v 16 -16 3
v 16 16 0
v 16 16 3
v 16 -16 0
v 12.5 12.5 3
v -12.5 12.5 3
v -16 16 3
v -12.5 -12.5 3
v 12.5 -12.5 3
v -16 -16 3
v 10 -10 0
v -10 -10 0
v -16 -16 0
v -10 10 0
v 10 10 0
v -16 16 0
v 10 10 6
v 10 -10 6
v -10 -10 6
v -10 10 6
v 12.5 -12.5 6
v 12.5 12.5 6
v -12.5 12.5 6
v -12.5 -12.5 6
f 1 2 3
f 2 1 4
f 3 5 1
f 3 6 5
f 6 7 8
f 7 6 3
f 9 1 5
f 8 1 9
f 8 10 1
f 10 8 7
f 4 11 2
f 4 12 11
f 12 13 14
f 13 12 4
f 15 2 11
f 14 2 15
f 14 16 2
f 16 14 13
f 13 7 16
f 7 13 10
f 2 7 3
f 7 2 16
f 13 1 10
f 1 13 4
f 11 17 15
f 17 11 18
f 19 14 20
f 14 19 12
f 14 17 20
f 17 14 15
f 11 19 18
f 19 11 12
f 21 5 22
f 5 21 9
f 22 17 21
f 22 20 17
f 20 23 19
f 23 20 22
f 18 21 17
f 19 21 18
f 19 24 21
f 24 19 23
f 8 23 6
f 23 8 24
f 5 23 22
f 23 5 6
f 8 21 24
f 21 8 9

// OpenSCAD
tilesize = 24;
wallthickness = 3;

//base
difference() {
translate([0,0,wallthickness/2])
cube([((tilesize+2)+(wallthickness*2)),((tilesize+2)+(wallthickness*2)),wallthickness],true);
translate([0,0,wallthickness/2])    
cube([tilesize-4,tilesize-4,wallthickness*4],true);
}

difference(){
translate([(tilesize+1)/-2,(tilesize+1)/-2,0])
cube([tilesize+1,tilesize+1,wallthickness+3]);

translate([0,0,wallthickness/2])    
cube([tilesize-4,tilesize-4,wallthickness*4],true);
}




